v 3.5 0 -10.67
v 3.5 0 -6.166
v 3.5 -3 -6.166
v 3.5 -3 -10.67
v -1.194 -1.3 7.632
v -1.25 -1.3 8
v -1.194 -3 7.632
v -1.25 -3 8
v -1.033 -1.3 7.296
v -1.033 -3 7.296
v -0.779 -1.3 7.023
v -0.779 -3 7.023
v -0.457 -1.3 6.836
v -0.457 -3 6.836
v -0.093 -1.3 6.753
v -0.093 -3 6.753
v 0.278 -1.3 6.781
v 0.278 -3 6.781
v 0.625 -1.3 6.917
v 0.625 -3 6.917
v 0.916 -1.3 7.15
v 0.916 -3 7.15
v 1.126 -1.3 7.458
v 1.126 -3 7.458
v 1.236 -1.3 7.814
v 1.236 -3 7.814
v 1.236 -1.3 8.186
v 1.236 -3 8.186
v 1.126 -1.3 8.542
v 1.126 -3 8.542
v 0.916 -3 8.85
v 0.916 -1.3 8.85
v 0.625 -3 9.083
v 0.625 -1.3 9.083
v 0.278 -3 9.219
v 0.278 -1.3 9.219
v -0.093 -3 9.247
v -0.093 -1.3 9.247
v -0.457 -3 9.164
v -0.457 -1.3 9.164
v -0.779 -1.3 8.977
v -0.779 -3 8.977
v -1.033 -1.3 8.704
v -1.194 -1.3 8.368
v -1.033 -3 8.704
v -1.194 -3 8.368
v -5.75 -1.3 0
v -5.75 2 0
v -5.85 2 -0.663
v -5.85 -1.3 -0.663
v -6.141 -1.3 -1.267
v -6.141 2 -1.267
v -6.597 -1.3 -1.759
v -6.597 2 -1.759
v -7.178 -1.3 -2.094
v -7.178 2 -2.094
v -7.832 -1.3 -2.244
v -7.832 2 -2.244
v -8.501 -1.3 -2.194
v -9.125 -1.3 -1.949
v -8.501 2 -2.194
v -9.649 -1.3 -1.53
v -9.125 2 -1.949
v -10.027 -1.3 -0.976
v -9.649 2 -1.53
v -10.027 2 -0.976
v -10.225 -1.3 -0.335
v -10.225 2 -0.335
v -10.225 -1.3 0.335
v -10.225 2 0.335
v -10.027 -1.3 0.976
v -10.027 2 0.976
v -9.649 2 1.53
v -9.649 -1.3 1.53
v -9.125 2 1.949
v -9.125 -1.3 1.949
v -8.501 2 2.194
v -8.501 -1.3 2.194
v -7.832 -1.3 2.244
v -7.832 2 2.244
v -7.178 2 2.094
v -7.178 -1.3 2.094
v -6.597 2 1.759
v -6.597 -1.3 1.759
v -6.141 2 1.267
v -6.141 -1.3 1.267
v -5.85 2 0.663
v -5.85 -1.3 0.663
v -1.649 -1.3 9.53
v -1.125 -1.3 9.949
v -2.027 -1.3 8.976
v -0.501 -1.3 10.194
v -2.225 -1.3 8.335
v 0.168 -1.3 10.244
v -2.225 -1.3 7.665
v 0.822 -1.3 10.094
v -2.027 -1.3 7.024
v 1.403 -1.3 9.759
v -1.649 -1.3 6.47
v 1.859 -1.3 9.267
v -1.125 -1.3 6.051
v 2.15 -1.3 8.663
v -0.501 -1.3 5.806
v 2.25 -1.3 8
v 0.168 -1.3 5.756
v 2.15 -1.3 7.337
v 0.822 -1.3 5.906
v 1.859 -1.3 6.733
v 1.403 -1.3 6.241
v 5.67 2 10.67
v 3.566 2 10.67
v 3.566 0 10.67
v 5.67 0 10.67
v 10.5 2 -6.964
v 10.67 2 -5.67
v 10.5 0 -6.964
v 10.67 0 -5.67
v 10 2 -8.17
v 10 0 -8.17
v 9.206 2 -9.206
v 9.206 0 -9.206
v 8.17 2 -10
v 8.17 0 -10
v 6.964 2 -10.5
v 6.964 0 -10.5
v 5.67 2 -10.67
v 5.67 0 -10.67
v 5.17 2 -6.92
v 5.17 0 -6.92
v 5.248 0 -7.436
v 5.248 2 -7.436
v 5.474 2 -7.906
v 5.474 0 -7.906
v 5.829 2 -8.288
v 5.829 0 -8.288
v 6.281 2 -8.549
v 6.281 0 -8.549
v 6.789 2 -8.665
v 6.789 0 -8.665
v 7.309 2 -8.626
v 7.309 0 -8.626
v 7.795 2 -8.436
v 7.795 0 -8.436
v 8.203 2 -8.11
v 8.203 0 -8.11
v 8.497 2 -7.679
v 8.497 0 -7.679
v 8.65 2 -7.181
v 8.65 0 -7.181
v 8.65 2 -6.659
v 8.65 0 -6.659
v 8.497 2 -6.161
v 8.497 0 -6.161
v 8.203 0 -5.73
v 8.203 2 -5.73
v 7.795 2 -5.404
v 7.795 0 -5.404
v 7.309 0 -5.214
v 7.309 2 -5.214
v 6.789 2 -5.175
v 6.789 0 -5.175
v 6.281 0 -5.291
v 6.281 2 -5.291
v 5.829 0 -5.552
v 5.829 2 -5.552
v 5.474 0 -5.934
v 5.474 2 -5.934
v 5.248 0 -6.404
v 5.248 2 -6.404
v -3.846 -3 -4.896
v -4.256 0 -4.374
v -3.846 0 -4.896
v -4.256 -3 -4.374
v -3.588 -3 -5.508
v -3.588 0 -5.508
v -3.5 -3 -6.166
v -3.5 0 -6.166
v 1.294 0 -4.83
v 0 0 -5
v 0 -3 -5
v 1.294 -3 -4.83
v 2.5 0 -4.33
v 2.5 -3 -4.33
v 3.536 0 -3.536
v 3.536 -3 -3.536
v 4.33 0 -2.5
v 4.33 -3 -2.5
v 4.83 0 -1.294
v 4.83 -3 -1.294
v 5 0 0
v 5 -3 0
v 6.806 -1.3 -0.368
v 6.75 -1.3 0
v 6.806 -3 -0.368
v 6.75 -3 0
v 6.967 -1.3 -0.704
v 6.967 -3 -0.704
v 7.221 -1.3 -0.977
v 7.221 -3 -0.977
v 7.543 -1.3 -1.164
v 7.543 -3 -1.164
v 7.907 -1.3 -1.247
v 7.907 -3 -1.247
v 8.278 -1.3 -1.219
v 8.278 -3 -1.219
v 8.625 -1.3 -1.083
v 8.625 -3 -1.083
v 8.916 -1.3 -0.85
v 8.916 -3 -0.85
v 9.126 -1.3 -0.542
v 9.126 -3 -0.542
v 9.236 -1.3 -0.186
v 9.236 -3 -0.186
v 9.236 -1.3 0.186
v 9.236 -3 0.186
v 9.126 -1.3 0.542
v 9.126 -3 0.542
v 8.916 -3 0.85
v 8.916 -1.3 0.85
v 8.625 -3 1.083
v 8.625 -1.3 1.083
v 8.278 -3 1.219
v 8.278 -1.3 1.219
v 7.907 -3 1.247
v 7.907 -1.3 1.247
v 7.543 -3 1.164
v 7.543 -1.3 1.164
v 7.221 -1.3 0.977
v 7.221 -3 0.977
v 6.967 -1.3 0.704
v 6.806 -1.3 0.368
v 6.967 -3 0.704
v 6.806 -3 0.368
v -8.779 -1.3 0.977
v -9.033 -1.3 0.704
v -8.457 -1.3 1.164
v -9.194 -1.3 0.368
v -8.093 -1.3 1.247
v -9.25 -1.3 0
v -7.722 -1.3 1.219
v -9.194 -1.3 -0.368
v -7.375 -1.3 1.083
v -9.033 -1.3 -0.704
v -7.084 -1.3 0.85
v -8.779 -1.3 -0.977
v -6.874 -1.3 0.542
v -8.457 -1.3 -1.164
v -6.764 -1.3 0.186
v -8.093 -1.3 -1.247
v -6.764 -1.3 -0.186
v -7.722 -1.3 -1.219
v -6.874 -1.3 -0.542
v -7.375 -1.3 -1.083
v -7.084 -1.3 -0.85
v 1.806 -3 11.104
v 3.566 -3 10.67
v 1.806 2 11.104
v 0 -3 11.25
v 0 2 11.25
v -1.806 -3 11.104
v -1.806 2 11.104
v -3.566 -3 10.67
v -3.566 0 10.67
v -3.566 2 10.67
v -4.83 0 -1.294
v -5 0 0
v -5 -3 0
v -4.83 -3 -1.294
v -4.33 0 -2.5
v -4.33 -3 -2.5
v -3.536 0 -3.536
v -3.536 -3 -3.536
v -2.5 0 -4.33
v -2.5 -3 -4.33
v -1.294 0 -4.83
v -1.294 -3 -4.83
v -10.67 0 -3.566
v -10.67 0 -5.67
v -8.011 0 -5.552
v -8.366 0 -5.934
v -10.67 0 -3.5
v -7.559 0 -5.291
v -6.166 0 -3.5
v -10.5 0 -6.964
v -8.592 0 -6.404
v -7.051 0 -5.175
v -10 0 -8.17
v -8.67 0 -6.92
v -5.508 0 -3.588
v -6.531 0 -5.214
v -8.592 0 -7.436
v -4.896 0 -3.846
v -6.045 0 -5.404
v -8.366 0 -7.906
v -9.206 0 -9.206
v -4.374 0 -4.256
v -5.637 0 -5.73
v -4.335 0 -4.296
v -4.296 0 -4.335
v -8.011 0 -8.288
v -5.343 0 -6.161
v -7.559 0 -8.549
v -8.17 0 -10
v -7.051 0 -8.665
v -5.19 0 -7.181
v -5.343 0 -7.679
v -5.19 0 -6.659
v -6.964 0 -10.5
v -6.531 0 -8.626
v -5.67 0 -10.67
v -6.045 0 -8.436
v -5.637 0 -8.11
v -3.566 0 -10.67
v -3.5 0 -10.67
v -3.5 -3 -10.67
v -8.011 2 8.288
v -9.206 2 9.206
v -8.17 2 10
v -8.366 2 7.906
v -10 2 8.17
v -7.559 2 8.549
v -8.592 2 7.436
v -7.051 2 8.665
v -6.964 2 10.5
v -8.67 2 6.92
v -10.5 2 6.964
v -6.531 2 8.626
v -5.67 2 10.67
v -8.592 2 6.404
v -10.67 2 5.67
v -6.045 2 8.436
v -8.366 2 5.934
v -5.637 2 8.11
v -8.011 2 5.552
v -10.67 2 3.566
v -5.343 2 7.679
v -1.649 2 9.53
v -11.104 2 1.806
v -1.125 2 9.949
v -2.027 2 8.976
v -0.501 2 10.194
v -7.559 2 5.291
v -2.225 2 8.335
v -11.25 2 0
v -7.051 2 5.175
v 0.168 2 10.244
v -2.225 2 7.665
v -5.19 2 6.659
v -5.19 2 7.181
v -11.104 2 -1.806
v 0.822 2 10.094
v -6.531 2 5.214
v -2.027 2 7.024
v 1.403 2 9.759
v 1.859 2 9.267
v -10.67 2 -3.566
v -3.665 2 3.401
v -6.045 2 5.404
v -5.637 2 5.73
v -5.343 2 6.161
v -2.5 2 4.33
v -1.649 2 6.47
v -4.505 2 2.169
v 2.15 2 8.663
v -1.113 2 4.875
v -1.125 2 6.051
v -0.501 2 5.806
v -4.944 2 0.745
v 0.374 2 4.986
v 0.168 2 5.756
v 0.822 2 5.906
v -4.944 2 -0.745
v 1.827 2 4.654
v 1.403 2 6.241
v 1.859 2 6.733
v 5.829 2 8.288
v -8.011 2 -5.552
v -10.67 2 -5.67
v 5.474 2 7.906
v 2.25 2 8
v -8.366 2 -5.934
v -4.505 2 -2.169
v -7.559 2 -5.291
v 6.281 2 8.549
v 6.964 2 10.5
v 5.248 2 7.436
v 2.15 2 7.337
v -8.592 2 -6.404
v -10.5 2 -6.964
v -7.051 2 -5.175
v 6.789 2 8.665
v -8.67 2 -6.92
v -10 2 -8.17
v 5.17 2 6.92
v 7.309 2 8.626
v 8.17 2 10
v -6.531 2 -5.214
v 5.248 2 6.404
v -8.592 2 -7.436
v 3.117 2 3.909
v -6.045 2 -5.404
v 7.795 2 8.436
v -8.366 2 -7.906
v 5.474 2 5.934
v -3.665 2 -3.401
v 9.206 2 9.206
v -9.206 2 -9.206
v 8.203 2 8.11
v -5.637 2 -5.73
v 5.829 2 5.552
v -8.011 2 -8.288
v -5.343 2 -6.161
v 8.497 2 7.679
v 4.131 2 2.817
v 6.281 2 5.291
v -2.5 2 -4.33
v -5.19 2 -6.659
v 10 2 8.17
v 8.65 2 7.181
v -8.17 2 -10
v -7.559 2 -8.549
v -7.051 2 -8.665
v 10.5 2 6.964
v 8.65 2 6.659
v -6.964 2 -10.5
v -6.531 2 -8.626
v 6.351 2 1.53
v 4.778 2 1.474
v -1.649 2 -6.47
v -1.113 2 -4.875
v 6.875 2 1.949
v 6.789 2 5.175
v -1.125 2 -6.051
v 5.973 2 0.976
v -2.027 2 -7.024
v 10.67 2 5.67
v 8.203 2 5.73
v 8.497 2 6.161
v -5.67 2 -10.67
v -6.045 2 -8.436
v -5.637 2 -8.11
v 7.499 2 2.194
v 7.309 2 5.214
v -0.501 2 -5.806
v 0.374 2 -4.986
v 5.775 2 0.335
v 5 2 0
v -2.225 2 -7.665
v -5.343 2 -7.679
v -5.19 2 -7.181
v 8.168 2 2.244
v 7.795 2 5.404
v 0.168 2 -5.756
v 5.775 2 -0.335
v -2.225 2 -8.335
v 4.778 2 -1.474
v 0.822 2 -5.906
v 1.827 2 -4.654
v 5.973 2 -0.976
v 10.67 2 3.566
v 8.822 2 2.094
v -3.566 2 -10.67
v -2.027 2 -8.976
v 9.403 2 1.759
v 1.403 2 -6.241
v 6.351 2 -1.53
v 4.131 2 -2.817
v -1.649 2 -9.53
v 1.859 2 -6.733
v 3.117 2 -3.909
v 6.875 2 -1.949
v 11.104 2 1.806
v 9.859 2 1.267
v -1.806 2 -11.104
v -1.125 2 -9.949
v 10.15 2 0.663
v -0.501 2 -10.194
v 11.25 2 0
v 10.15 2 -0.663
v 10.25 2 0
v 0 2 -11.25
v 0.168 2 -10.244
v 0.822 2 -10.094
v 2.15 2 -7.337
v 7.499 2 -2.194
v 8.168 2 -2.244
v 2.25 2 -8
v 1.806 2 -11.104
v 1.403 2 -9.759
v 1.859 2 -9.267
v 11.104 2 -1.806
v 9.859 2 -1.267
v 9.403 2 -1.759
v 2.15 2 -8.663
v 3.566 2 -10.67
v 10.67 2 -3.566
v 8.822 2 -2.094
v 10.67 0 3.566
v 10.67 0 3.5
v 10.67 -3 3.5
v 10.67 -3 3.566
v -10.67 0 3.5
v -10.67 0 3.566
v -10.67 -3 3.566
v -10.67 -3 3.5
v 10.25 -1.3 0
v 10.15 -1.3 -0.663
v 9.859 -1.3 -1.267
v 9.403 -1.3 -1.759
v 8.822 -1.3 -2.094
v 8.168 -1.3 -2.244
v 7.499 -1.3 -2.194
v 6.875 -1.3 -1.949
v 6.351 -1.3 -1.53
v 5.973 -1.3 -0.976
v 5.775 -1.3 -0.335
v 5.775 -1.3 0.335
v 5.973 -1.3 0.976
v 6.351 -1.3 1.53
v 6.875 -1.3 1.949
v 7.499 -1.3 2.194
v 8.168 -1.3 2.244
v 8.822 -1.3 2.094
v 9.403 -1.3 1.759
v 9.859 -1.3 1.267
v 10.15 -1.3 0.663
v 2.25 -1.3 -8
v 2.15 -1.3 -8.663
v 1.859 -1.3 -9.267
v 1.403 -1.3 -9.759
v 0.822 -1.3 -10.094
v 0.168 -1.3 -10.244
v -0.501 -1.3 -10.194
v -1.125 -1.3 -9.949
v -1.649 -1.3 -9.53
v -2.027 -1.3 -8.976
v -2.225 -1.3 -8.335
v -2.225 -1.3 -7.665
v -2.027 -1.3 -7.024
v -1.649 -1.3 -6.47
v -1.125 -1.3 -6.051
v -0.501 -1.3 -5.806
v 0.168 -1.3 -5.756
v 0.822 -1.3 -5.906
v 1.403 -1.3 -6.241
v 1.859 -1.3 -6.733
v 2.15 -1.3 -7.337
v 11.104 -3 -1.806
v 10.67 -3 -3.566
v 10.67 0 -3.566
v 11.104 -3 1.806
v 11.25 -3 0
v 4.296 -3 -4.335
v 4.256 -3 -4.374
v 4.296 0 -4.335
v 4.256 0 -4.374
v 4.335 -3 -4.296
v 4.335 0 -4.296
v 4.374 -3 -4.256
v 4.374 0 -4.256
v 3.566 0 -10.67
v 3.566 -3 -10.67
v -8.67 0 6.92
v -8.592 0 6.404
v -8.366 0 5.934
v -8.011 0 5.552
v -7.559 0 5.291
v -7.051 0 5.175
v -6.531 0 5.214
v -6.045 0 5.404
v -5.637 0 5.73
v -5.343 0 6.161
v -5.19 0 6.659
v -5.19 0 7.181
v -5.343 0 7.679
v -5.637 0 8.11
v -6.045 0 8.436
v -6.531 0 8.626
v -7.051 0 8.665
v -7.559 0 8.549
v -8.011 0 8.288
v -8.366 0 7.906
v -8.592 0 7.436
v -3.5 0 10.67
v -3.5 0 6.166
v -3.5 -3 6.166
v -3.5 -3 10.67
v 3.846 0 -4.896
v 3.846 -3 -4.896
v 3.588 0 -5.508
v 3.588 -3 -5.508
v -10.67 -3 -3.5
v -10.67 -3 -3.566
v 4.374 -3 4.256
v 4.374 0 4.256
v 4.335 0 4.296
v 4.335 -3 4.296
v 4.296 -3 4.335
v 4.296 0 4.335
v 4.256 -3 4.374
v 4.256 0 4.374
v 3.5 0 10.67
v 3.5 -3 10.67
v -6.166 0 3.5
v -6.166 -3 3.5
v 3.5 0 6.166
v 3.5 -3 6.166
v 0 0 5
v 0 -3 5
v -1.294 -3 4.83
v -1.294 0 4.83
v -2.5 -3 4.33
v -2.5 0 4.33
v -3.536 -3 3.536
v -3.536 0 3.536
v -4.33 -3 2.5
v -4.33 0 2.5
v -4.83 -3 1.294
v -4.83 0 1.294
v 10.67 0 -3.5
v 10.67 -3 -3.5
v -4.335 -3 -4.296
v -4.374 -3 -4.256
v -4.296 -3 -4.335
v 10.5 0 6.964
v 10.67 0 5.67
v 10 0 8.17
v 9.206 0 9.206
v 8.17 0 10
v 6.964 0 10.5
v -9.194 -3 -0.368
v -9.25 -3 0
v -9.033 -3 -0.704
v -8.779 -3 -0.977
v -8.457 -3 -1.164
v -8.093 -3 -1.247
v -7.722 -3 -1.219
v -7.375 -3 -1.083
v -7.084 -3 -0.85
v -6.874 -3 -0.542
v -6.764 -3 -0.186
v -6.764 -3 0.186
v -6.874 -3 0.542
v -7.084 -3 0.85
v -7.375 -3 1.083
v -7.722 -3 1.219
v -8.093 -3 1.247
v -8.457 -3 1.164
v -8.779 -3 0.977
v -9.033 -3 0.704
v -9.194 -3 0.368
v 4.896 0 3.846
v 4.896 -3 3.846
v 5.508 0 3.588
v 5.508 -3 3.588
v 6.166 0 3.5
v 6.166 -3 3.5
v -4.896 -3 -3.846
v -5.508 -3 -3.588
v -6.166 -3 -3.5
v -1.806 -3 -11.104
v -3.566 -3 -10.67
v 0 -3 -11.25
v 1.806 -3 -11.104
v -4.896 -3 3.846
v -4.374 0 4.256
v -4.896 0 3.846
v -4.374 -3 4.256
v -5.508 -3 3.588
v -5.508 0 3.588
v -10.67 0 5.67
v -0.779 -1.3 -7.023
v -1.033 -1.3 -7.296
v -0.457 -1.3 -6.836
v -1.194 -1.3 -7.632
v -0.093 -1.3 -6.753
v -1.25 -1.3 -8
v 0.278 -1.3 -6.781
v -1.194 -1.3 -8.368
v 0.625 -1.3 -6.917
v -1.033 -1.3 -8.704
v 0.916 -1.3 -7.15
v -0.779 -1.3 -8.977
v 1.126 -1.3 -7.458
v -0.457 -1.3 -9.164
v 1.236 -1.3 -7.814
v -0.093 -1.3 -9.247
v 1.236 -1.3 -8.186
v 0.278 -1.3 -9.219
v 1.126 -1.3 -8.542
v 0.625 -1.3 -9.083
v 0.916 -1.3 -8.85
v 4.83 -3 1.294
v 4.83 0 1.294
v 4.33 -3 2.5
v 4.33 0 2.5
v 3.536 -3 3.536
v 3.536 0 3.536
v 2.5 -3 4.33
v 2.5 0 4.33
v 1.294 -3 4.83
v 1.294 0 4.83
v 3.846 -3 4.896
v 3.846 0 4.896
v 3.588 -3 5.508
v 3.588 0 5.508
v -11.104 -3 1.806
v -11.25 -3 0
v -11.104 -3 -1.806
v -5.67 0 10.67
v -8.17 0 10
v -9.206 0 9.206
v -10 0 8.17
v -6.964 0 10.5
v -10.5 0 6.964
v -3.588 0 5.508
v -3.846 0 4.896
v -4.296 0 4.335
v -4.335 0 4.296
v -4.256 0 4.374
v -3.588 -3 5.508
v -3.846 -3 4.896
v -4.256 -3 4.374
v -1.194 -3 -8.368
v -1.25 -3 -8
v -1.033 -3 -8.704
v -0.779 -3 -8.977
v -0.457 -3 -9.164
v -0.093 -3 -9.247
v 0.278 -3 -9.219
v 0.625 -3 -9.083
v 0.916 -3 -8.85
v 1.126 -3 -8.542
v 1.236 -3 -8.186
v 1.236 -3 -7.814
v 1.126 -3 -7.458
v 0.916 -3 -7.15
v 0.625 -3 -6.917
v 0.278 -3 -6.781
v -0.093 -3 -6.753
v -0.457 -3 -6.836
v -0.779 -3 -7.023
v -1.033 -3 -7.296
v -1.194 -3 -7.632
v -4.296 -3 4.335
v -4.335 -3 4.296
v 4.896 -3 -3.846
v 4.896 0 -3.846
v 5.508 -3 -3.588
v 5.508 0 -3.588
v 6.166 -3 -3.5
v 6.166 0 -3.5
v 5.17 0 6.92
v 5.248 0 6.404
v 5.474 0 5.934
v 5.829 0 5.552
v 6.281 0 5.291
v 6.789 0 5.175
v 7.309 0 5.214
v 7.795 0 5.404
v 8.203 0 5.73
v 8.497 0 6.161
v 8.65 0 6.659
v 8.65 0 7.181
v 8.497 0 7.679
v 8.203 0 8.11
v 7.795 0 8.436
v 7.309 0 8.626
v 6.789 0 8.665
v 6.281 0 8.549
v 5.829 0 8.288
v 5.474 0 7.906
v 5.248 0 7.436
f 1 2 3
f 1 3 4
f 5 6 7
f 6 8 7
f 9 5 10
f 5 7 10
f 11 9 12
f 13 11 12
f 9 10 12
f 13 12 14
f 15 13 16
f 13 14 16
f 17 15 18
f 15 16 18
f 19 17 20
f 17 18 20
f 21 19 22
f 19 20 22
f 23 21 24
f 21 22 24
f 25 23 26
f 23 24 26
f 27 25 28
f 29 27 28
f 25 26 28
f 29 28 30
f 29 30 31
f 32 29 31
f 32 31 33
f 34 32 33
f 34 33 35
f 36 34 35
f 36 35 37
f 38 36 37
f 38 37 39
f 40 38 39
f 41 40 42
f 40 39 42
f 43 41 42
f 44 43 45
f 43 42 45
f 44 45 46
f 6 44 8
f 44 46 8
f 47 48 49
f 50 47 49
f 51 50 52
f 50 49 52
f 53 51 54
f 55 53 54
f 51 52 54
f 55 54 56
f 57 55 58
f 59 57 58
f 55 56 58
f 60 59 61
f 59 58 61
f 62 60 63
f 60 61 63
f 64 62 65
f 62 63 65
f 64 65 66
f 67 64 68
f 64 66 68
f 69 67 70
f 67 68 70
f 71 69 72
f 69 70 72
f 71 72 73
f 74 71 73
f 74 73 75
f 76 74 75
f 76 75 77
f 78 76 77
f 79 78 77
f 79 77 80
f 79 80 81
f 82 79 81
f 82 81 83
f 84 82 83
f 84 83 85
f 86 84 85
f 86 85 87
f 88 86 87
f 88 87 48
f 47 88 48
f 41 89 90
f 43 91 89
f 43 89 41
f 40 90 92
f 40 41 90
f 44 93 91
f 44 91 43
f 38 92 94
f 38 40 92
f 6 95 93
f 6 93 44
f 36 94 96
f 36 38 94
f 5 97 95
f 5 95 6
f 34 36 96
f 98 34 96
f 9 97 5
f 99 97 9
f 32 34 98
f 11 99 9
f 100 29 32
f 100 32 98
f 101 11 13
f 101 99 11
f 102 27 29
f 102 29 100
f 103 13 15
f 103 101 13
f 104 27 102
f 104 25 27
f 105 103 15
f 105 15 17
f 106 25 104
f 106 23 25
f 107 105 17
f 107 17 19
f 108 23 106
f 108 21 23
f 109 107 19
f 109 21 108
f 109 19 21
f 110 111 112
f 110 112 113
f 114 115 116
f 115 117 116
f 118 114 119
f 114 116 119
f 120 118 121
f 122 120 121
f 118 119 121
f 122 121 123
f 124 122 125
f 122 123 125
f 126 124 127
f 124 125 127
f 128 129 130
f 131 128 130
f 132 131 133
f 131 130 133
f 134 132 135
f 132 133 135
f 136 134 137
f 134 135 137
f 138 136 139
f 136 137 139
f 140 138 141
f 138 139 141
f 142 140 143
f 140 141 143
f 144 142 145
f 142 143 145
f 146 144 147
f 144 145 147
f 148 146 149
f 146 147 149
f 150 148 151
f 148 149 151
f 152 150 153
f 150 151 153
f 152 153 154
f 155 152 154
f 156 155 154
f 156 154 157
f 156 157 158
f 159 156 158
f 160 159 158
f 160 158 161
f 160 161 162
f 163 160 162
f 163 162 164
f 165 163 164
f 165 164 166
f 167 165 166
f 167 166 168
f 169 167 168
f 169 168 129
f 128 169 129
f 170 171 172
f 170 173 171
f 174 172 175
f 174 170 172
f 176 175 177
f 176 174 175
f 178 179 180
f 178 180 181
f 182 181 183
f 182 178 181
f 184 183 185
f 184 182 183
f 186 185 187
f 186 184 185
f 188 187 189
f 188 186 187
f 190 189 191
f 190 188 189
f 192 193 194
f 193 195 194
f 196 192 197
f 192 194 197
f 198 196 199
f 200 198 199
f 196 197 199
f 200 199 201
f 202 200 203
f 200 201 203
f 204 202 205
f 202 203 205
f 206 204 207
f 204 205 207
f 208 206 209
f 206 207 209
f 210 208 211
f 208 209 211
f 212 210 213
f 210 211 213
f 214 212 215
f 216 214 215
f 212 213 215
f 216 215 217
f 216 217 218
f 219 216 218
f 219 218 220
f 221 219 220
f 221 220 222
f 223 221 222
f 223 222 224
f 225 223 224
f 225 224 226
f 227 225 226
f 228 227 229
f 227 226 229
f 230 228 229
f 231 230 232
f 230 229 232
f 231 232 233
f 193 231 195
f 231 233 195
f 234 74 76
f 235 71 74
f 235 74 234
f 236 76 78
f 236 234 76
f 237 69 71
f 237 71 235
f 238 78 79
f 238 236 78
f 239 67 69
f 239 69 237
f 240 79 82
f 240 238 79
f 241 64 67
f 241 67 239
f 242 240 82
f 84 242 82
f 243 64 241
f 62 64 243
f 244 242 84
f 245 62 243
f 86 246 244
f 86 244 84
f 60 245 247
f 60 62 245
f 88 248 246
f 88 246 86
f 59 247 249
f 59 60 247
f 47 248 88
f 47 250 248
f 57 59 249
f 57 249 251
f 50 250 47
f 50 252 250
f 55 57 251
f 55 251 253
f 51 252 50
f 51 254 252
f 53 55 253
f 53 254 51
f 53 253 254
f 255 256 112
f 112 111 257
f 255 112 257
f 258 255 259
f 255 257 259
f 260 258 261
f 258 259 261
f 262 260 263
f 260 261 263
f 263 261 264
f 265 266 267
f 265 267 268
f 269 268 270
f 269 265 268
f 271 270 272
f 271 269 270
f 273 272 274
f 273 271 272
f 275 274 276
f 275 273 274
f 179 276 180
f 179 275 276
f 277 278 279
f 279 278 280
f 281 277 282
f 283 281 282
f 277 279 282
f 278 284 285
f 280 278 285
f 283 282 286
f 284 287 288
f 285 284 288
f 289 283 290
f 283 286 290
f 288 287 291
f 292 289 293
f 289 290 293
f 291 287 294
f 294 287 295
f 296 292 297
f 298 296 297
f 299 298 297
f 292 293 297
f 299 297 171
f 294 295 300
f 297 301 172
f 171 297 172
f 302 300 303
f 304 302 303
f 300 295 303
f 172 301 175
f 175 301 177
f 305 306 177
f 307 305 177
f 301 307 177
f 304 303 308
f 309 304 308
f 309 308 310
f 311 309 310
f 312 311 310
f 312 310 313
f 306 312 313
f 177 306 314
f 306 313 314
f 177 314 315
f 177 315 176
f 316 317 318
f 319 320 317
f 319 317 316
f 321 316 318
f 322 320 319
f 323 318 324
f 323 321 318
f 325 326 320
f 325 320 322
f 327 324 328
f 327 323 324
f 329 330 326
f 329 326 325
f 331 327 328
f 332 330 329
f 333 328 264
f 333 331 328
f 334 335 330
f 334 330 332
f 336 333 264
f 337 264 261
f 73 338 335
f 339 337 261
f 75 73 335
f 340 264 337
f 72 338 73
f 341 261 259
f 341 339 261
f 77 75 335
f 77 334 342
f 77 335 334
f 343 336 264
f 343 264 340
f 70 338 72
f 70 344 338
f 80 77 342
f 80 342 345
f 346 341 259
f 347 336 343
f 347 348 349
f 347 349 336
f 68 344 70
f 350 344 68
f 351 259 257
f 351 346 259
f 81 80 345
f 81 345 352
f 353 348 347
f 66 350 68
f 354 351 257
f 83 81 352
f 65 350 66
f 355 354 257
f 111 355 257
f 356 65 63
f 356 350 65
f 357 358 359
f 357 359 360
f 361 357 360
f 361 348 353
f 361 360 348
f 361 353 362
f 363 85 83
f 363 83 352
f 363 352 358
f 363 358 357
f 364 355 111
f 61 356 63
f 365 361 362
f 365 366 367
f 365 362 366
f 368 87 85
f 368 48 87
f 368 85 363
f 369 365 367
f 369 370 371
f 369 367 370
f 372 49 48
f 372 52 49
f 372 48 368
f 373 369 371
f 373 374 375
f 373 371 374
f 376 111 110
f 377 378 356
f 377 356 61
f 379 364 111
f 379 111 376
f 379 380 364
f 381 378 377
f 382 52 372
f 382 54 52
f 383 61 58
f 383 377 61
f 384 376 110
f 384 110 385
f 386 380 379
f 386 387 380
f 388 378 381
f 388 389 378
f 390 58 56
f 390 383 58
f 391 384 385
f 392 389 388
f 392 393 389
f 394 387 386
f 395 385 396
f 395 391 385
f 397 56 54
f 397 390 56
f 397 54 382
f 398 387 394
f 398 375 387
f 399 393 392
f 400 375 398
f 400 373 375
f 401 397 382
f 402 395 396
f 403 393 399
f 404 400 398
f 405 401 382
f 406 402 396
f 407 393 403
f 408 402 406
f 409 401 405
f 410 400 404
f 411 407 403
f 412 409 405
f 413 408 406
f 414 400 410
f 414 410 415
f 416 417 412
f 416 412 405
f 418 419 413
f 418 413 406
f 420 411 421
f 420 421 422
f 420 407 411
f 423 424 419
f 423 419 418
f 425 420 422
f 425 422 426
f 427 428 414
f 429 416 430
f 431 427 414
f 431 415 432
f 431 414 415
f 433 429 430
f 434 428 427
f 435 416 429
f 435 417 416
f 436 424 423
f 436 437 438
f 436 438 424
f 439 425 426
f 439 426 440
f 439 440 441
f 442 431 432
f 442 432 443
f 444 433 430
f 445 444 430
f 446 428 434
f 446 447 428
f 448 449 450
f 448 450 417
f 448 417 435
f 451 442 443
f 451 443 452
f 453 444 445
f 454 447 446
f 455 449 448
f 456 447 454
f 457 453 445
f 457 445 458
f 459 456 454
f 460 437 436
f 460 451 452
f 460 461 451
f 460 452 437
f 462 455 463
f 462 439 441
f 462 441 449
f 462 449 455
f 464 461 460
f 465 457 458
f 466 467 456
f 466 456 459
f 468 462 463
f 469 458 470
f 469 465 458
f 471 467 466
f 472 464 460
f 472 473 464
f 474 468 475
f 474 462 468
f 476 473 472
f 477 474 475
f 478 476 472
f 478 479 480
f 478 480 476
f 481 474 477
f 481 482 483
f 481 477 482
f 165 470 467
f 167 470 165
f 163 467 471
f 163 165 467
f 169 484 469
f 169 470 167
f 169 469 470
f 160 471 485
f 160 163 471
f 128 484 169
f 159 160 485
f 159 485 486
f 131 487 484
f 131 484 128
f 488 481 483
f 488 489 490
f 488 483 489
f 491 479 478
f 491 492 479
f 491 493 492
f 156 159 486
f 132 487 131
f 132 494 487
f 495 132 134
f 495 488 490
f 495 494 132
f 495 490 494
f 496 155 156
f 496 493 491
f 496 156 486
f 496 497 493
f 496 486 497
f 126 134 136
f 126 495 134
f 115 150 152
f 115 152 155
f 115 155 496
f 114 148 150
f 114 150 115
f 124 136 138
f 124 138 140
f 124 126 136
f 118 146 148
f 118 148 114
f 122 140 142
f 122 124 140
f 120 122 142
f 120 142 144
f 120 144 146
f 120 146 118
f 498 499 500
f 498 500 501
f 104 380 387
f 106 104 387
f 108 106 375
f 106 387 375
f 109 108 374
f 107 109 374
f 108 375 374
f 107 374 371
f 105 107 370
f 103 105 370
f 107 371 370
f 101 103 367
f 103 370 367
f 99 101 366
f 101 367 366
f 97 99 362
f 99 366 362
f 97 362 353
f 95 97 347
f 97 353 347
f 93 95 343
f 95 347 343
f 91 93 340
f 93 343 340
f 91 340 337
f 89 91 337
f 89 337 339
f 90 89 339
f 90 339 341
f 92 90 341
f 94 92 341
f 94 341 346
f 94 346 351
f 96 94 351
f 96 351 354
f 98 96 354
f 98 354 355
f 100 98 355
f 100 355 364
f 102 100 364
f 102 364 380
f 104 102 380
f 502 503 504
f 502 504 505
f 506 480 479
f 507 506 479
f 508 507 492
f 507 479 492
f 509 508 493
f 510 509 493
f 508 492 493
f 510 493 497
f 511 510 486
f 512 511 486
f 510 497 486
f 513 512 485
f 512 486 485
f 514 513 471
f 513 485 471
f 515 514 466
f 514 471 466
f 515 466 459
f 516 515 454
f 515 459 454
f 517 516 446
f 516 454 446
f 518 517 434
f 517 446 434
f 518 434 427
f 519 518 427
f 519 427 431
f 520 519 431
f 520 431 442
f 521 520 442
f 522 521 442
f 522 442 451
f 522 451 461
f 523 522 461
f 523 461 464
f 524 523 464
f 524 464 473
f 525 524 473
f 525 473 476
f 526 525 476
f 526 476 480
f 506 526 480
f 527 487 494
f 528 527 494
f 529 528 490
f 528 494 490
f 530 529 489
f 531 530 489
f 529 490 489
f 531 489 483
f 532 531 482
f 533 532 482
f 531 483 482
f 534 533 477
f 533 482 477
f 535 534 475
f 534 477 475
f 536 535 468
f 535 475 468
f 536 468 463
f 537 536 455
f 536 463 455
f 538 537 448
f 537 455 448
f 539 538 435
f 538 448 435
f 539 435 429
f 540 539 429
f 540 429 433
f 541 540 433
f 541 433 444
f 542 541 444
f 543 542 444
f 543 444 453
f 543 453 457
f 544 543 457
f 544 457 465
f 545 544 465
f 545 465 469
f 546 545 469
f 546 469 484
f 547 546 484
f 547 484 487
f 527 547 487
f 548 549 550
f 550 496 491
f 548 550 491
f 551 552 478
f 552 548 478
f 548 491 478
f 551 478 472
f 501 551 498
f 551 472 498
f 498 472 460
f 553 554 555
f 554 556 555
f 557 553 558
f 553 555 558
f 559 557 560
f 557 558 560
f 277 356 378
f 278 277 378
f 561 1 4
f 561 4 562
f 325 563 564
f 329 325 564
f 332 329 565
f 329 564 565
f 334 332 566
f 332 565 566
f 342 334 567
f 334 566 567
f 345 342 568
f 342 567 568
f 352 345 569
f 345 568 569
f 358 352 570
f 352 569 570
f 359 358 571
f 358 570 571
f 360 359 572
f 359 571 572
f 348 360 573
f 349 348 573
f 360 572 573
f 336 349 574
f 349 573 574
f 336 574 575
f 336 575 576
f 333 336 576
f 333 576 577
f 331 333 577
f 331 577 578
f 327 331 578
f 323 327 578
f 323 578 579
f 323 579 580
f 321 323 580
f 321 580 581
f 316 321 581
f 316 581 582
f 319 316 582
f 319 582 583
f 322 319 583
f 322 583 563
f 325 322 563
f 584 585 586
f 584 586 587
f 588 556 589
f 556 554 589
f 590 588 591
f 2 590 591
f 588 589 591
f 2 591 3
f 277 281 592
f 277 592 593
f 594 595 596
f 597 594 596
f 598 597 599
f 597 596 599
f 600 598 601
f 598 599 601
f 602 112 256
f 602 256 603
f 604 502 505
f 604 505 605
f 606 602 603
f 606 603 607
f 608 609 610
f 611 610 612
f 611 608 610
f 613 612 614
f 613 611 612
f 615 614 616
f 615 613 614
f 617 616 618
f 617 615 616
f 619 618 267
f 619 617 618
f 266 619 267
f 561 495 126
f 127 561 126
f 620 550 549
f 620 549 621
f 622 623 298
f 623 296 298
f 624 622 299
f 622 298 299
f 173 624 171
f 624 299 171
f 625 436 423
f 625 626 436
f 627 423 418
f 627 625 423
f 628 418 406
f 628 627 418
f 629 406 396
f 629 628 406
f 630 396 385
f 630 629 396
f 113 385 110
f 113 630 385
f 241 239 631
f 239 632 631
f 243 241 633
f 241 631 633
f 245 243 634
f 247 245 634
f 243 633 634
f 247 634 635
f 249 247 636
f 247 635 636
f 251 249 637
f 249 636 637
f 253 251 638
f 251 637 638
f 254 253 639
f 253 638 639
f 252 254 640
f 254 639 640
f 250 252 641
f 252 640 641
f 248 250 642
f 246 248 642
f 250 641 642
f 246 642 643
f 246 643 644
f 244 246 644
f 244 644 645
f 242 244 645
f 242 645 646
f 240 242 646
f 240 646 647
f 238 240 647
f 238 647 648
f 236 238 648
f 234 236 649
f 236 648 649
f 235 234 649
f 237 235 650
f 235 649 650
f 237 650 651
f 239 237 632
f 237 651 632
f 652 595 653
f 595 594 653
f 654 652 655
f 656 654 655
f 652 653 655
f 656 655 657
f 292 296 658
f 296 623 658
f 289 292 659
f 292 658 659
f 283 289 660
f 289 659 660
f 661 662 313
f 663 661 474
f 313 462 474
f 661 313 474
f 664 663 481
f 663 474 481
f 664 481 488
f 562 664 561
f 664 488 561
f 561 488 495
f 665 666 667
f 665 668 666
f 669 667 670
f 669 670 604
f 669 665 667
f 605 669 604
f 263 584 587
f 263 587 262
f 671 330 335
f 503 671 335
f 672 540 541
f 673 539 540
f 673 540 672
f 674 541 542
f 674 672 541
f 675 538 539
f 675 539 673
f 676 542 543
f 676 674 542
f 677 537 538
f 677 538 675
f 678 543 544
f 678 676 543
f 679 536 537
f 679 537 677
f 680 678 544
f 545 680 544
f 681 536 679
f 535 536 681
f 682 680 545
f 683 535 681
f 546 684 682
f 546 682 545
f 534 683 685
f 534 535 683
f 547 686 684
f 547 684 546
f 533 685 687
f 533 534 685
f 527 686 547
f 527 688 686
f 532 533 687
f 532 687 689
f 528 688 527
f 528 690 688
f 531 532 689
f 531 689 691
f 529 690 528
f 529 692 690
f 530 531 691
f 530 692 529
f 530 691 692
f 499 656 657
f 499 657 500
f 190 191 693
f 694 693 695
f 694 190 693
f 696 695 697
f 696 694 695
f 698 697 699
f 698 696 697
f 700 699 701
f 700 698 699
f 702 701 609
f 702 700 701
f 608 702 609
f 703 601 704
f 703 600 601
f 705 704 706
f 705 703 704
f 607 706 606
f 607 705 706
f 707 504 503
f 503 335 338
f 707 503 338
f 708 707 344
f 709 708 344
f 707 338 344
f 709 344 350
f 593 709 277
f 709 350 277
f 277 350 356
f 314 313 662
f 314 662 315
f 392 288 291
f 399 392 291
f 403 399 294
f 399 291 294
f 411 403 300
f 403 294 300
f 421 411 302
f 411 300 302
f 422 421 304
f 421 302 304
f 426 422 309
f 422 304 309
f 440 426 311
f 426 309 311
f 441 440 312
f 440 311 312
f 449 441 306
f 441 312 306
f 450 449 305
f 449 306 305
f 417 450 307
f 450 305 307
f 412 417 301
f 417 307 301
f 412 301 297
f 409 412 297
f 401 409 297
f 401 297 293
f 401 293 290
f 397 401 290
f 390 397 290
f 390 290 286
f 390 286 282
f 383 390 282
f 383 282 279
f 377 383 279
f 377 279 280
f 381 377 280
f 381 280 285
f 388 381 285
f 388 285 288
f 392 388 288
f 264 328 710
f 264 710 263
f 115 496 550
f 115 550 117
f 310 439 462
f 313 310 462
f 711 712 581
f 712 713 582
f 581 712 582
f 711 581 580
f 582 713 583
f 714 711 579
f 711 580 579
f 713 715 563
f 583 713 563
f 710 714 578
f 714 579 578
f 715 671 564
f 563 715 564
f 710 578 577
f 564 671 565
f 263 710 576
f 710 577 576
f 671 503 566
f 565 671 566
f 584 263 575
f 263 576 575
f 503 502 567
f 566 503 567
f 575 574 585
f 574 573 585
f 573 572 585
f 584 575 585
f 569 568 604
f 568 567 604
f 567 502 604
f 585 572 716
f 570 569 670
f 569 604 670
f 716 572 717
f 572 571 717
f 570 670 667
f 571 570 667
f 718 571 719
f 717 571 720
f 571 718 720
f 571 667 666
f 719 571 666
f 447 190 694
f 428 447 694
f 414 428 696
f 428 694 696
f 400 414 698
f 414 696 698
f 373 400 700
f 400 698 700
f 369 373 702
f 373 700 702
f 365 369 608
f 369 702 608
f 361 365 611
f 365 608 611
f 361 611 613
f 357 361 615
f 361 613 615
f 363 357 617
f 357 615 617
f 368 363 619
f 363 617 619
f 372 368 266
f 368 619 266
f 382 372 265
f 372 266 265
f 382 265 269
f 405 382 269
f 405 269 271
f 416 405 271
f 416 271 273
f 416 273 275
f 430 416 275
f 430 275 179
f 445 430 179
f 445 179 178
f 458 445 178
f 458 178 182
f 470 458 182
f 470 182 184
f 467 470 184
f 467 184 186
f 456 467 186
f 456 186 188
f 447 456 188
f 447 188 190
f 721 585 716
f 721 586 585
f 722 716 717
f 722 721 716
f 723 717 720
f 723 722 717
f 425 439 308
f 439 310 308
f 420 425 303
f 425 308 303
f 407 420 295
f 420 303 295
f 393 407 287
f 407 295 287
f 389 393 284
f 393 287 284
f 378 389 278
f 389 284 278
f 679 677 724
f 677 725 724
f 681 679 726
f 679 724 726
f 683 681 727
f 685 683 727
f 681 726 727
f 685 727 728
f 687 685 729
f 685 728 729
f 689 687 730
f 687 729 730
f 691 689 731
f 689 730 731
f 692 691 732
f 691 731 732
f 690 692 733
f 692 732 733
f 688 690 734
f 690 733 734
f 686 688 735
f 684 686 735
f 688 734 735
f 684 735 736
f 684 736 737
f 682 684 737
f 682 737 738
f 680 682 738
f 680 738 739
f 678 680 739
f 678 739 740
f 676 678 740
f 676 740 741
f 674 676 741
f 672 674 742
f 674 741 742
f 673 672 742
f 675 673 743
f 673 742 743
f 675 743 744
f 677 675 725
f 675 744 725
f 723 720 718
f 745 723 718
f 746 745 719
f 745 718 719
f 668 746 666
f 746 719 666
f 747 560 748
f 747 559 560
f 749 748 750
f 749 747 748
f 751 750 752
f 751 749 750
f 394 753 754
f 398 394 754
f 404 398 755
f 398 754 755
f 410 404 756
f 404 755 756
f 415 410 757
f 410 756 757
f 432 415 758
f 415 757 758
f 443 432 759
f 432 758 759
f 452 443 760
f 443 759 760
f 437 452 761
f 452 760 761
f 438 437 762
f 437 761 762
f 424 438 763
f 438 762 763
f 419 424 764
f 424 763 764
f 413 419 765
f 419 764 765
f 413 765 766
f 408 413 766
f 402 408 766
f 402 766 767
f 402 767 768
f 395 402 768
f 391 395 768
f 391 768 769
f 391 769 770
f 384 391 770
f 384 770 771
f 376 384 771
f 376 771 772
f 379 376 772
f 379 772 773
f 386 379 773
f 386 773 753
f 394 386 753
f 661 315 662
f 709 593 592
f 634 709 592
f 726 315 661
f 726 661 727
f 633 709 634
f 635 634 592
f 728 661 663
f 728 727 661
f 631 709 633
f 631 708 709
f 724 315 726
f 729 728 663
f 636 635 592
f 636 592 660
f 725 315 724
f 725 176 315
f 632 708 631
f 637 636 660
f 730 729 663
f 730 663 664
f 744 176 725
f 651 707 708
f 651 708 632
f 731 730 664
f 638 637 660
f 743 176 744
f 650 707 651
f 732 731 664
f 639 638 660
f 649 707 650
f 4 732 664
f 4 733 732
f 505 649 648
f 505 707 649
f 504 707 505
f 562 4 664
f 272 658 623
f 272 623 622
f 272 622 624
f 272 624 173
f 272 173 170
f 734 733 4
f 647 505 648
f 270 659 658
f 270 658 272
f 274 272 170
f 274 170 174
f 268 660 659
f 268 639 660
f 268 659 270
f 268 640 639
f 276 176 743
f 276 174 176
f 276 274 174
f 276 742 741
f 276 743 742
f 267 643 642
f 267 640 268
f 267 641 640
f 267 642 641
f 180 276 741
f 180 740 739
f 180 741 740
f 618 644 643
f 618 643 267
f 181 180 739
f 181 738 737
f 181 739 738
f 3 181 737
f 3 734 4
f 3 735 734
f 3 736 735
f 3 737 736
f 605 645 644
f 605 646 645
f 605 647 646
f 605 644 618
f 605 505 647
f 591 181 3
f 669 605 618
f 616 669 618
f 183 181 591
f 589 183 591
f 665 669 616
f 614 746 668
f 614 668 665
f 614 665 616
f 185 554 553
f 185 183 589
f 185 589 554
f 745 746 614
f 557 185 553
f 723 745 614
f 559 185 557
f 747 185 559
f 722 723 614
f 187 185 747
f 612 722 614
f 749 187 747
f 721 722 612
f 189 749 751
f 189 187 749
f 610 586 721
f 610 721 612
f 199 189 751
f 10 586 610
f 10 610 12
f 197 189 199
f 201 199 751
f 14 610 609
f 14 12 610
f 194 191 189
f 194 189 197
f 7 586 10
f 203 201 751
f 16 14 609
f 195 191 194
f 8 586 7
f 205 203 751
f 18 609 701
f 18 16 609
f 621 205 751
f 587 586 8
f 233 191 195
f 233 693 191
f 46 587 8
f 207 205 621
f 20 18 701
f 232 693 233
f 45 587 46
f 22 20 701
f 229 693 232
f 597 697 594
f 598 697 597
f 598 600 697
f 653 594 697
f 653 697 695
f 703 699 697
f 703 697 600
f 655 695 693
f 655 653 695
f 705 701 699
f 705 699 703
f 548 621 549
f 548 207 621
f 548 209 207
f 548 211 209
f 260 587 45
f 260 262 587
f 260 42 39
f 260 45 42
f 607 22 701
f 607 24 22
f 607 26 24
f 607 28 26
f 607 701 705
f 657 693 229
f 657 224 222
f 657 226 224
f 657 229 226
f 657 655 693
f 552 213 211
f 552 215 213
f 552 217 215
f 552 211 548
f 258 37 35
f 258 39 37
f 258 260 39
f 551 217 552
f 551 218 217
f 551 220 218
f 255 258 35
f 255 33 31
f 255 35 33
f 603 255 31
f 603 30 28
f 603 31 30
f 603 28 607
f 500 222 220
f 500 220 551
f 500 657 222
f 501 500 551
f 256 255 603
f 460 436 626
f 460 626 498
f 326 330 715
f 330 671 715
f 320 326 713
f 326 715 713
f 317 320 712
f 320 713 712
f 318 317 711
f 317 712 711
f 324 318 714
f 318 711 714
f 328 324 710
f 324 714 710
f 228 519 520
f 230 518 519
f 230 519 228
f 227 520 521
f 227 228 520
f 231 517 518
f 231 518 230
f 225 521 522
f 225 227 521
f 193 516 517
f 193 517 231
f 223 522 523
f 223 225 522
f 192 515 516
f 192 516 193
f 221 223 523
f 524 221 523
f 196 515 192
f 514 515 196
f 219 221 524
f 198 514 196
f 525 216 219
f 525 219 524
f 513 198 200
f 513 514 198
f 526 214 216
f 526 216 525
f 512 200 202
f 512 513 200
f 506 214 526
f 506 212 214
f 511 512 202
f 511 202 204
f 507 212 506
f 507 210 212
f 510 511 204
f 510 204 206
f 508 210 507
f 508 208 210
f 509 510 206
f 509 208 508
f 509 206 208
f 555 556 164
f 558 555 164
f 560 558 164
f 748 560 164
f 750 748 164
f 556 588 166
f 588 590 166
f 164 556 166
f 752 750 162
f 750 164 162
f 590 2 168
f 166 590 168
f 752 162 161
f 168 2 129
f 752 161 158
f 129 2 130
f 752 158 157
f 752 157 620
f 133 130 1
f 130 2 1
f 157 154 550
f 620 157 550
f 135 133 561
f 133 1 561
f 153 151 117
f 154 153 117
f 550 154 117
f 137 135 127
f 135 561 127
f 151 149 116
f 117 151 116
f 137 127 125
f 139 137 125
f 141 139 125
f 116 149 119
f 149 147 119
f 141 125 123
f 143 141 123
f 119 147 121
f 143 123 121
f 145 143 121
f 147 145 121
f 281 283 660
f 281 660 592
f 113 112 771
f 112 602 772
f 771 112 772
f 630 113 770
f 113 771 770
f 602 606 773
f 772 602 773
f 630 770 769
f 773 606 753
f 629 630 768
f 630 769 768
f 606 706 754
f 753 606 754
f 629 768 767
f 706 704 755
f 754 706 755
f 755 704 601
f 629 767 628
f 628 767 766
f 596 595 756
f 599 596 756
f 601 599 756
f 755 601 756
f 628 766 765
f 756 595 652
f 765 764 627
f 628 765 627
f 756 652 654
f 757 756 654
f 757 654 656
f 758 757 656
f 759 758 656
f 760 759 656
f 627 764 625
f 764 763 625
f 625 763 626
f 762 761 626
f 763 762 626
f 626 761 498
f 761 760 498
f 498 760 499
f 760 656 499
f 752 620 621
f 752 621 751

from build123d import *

# Parameters (mm, degrees)
ESQUISSE1_R                                     = 11.25
BOSS_EXTRU_1_DEPTH                              = 2
ESQUISSE8_R                                     = 11.25
BOSS_EXTRU_2_DEPTH                              = 3
ESQUISSE15_W                                    = 21.34
ESQUISSE15_H                                    = 21.34
BOSS_EXTRU_3_DEPTH                              = 2
ESQUISSE14_R                                    = 5
ENL_V_MAT_EXTRU_3_DEPTH                         = 6
D_GAGEMENT_M21_D                                = 3.5
ENL_V_MAT_EXTRU_11_DEPTH                        = 3
CONG_1_R                                        = 5
ESQUISSE20_R                                    = 6.103277808
ESQUISSE20_R_2                                  = 5
BOSS_EXTRU_5_DEPTH                              = 3
CONG_3_R                                        = 2.5
CHAMBRAGE_POUR_VIS_T_TE_CYLINDRIQUE_D           = 2.5
CHAMBRAGE_POUR_VIS_T_TE_CYLINDRIQUE_CBORE_D     = 4.5
CHAMBRAGE_POUR_VIS_T_TE_CYLINDRIQUE_CBORE_DEPTH = 3.3


with BuildPart() as part:
    # Esquisse1 → Boss.-Extru.1 (new body)
    with BuildSketch(Plane(origin=(0, 0, 0), x_dir=(1, 0, 0), z_dir=(0, 1, 0))):
        Circle(ESQUISSE1_R)
    extrude(amount=BOSS_EXTRU_1_DEPTH)

    # Esquisse8 → Boss.-Extru.2 (add)
    with BuildSketch(Plane.XZ):
        Circle(ESQUISSE8_R)
    extrude(amount=BOSS_EXTRU_2_DEPTH)

    # Esquisse15 → Boss.-Extru.3 (add)
    with BuildSketch(Plane(origin=(0, 2, 0), x_dir=(1, 0, 0), z_dir=(0, 1, 0))):
        Rectangle(ESQUISSE15_W, ESQUISSE15_H)
    extrude(amount=-BOSS_EXTRU_3_DEPTH)

    # Esquisse14 → Enlèv. mat.-Extru.3 (cut)
    with BuildSketch(Plane.XZ.offset(3)):
        Circle(ESQUISSE14_R)
    extrude(amount=-ENL_V_MAT_EXTRU_3_DEPTH, mode=Mode.SUBTRACT)

    # Dégagement M21 (through all)
    with Locations(Plane(origin=(0, 2, 0), x_dir=(1, 0, 0), z_dir=(0, 1, 0))):
        with Locations((6.92, -6.92), (-6.92, -6.92), (-6.92, 6.92), (6.92, 6.92)):
            Hole(D_GAGEMENT_M21_D / 2)

    # Esquisse18 → Enlèv. mat.-Extru.11 (cut)
    with BuildSketch(Plane.XZ):
        Polygon((-3.5, -10.67), (-3.5, -5), (3.5, -5), (3.5, -10.67), (10.67, -10.67), (10.67, -3.5), (5, -3.5), (5, 3.5), (10.67, 3.5), (10.67, 10.67), (3.5, 10.67), (3.5, 5), (-3.5, 5), (-3.5, 10.67), (-10.67, 10.67), (-10.67, 3.5), (-5, 3.5), (-5, -3.5), (-10.67, -3.5), (-10.67, -10.67), align=None)
    extrude(amount=ENL_V_MAT_EXTRU_11_DEPTH, mode=Mode.SUBTRACT)

    # Congé1
    cong_1_edges = [part.edges().sort_by_distance(p)[0] for p in [
        (-10.67, 1, 10.67),
        (-10.67, 1, -10.67),
        (10.67, 1, -10.67),
        (10.67, 1, 10.67),
    ]]
    fillet(cong_1_edges, radius=CONG_1_R)

    # Esquisse20 → Boss.-Extru.5 (add)
    with BuildSketch(Plane.XZ):
        Circle(ESQUISSE20_R)
        Circle(ESQUISSE20_R_2, mode=Mode.SUBTRACT)
    extrude(amount=BOSS_EXTRU_5_DEPTH)

    # Congé3
    cong_3_edges = [part.edges().sort_by_distance(p)[0] for p in [
        (-5, -1.5, 3.5),
        (-3.5, -1.5, -5),
        (5, -1.5, -3.5),
        (3.5, -1.5, 5),
        (-5, -1.5, -3.5),
        (3.5, -1.5, -5),
        (5, -1.5, 3.5),
        (-3.5, -1.5, 5),
    ]]
    fillet(cong_3_edges, radius=CONG_3_R)

    # Chambrage pour vis à tête cylindrique à 6 pans creux (ou vis CHC) M21 (through all)
    with Locations(Plane(origin=(0, 2, 0), x_dir=(1, 0, 0), z_dir=(0, 1, 0))):
        with Locations((-8, 0), (0, -8), (8, 0), (0, 8)):
            CounterBoreHole(CHAMBRAGE_POUR_VIS_T_TE_CYLINDRIQUE_D / 2, CHAMBRAGE_POUR_VIS_T_TE_CYLINDRIQUE_CBORE_D / 2, CHAMBRAGE_POUR_VIS_T_TE_CYLINDRIQUE_CBORE_DEPTH)


solid = part.part
